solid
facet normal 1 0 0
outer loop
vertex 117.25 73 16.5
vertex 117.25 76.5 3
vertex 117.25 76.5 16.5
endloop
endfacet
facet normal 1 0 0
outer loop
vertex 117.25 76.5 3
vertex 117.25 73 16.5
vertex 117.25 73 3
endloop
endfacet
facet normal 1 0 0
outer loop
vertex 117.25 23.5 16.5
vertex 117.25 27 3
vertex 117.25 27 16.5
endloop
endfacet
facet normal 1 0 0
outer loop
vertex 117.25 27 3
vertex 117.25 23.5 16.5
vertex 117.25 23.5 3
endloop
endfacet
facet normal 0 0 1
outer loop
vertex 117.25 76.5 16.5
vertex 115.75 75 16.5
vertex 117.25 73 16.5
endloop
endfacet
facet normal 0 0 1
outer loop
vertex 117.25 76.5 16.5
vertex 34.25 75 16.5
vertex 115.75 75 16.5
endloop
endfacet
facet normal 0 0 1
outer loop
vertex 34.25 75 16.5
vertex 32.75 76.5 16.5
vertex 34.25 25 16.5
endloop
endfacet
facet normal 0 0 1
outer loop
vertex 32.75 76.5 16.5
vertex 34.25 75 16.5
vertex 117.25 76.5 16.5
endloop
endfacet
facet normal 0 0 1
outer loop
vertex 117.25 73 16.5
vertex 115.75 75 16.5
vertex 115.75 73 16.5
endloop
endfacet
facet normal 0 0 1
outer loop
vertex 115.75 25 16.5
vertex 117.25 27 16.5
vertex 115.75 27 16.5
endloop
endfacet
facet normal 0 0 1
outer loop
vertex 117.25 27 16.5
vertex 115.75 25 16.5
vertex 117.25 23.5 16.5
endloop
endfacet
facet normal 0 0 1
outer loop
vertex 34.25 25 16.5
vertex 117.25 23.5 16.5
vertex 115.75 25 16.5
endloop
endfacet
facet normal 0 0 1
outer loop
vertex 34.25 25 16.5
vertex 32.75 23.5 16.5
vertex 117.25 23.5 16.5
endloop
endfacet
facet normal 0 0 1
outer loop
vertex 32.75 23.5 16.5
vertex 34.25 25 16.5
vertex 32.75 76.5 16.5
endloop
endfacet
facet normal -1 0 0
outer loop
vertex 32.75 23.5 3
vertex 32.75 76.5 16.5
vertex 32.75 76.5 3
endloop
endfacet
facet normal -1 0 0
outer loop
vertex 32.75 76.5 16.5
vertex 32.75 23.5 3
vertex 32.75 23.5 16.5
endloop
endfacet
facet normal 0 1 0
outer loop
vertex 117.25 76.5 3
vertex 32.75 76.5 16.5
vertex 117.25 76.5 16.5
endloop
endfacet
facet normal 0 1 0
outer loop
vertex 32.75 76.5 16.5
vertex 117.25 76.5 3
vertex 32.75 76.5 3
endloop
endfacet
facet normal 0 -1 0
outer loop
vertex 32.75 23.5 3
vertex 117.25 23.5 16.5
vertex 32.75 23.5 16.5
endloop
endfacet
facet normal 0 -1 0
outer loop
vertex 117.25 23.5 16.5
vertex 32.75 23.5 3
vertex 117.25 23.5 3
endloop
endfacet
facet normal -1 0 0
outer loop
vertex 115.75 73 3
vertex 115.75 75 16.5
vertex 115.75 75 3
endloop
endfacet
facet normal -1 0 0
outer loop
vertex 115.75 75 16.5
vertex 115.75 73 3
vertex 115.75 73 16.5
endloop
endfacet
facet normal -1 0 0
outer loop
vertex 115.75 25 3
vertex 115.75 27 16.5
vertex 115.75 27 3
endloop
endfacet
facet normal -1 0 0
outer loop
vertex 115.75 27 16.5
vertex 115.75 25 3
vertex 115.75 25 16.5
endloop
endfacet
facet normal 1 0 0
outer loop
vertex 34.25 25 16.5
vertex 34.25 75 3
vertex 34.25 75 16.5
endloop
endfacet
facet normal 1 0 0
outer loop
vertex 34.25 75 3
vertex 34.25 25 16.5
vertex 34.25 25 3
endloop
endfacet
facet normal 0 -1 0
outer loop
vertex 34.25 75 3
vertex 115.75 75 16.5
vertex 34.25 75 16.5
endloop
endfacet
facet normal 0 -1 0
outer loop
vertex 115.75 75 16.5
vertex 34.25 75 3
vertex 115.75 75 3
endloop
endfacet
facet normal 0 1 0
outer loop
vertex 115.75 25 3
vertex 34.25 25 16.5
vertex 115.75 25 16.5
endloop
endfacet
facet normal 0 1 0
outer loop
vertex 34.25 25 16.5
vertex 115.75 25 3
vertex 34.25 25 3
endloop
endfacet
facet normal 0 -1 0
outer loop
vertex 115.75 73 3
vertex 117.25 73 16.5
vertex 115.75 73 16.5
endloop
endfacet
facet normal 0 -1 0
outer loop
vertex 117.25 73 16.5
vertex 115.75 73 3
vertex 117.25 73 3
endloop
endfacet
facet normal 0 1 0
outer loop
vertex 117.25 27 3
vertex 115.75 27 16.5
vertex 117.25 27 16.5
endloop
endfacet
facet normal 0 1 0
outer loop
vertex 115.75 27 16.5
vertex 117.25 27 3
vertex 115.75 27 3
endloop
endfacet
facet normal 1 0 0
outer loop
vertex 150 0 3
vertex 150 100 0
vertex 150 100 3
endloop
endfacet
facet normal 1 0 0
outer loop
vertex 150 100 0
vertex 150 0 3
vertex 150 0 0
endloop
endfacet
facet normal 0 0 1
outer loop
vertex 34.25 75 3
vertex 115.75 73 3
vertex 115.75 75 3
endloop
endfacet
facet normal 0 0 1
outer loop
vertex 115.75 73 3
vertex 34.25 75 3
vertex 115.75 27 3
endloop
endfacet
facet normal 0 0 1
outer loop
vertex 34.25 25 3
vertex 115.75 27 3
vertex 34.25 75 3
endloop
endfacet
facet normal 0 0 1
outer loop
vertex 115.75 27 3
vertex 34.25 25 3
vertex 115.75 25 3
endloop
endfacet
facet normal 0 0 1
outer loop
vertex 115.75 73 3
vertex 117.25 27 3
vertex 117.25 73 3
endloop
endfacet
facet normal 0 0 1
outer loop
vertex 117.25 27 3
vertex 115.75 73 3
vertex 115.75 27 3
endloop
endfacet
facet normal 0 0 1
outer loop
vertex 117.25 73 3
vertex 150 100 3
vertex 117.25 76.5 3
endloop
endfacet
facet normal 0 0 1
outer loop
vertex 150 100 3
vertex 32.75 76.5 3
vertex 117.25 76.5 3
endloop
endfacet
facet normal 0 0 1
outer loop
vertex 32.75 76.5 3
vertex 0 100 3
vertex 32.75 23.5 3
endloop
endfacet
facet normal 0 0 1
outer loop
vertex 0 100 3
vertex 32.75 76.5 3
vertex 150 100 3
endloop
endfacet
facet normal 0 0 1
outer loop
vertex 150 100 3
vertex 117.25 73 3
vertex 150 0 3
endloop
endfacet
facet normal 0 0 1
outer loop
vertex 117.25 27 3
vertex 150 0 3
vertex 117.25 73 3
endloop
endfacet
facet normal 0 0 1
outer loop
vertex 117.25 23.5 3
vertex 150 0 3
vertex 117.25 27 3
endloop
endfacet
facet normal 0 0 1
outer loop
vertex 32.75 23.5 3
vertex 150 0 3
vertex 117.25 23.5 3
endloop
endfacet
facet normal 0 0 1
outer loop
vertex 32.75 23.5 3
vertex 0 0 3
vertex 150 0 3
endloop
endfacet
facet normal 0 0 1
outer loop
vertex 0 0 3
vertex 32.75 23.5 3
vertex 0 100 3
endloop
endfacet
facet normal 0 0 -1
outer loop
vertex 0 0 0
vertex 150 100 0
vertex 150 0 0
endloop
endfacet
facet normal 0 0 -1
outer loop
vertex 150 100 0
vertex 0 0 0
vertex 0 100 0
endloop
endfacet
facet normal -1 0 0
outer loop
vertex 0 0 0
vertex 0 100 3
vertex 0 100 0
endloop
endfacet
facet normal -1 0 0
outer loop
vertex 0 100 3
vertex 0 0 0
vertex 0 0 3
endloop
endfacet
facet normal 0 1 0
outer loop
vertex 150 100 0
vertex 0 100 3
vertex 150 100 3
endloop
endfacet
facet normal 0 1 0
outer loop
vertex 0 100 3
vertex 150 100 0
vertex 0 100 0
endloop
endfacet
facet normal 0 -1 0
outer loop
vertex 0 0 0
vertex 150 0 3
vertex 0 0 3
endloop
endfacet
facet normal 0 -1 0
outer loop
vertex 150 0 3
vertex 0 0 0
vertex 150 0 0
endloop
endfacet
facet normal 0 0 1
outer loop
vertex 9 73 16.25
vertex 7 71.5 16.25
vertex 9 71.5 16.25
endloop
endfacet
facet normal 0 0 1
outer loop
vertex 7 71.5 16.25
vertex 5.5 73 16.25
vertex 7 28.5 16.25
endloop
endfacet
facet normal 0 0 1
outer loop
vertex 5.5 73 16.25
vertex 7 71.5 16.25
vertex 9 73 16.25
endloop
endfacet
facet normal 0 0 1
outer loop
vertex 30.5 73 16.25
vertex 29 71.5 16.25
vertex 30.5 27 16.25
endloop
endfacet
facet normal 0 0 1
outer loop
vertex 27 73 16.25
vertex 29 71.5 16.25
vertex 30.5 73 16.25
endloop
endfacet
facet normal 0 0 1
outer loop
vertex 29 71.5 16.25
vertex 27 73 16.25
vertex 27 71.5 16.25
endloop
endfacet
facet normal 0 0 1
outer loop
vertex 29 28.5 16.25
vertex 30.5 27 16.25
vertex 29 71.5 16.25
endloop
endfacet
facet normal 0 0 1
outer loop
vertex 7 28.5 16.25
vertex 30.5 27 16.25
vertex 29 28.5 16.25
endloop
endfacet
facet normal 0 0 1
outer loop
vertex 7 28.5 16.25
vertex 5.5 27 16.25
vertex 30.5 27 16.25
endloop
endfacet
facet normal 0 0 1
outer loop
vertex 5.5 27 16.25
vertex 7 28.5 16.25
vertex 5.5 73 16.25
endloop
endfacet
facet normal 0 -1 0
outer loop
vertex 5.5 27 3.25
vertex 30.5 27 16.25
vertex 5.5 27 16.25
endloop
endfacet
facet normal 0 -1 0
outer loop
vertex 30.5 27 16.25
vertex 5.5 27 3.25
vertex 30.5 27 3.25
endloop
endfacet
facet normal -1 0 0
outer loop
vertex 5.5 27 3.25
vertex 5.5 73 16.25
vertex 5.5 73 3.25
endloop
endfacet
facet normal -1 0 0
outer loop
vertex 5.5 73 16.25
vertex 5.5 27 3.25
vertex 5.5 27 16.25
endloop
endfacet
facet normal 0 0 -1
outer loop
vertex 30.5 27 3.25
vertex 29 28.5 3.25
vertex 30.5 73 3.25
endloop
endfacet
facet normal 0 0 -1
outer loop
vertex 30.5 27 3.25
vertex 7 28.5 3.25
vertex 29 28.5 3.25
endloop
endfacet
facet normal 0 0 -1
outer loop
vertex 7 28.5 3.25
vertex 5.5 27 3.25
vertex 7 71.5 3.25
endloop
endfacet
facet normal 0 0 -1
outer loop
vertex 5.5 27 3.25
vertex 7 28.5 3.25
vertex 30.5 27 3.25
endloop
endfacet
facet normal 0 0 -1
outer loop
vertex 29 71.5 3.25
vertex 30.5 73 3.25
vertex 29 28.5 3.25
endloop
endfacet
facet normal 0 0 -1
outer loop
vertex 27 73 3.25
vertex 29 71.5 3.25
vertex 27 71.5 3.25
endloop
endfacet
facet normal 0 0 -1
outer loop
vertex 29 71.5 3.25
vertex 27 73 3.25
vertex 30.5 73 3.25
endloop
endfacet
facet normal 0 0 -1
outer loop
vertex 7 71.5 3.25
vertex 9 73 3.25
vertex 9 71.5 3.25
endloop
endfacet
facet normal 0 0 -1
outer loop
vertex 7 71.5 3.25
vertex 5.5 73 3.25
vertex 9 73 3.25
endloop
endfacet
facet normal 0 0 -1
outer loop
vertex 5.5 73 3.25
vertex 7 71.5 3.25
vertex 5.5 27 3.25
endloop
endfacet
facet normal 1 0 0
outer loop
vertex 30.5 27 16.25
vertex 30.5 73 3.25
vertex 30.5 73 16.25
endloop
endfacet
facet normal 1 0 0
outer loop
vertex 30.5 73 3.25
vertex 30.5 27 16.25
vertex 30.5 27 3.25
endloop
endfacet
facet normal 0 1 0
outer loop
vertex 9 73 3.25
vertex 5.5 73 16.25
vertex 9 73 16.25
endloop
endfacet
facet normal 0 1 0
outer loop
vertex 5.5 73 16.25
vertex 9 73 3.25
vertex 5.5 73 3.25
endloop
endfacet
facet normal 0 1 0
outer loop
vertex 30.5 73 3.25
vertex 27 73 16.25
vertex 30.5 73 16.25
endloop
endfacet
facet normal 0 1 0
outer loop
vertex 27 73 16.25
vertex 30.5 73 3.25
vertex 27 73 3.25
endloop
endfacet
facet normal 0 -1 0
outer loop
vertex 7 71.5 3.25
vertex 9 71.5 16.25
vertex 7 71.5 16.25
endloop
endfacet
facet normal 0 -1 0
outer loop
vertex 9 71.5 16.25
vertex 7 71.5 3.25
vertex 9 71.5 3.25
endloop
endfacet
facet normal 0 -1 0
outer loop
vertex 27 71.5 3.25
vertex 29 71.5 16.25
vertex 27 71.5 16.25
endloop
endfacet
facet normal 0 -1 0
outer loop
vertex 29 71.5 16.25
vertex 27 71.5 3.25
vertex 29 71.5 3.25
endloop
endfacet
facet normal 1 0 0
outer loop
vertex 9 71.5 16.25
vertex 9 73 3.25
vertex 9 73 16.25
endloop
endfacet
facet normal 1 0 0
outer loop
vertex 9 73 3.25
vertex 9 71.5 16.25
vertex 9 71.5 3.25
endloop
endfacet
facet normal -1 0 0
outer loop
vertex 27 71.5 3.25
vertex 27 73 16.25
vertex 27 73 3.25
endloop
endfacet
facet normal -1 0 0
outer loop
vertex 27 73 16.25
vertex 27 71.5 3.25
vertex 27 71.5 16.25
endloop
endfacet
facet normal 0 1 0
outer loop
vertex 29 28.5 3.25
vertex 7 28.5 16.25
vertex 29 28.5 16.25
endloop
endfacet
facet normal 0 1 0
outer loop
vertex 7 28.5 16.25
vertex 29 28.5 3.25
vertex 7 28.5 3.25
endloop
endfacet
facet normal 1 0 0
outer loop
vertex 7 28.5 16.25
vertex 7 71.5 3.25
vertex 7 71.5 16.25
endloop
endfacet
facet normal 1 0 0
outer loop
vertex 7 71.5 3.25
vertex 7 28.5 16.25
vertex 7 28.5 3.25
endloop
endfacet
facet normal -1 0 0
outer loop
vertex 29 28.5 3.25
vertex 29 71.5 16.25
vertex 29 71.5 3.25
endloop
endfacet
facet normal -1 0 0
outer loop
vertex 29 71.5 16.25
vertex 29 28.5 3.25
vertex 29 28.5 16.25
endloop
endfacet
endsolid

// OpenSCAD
// Description: Quadcopter Baseplate for mounting 3DR Pixel Hawk and ORX R165X Reciver.
//              For use with similar plates to create a Quadcopter without arms.
// Authors: Leo Mahdessian
// 
// Licence:
// This work is licensed under the Creative Commons Attribution-NonCommercial-ShareAlike 4.0 International License. 
// To view a copy of this license, visit http://creativecommons.org/licenses/by-nc-sa/4.0/ or send a letter to Creative Commons, 444 Castro Street, Suite 900, Mountain View, California, 94041, USA.


//Sets Resolution
$fn = 30;

//Baseplate and Pixel Hawk holder
module plate(length, width, height) {
	cube([length, width, height]);
	
	difference(){
		difference() {
	
			translate([length/2, width/2, 7.75+1]) {
				cube([81.5+height, 50+height, 15.5], center=true);	
			}

			translate([length/2, width/2, 7.75+1]) {
				cube([81.5, 50, 15.5], center=true);
			}
		}
		
		translate([length/2+41, width/2, 7.75+1]) {
			cube([3, 46, 15.5], center=true);
		}
	}

}

//Orange Reciver Holder
module RCreceiver() {
	difference() {
		difference() {
			rotate(a = 90, v = [0,0,1]) {
				translate([50, -18, 9.75]) {
					cube([46, 25, 13], center = true); 
				}
			}

			rotate(a = 90, v = [0,0,1]) {
				translate([73, -18, 9.75]) {
					cube([3, 18, 13], center = true); 
				}
			}

		}

		rotate(a = 90, v = [0,0,1]) {
			translate([50, -18, 9.75]) {
				cube([43, 22, 13], center = true); 
			}
		}
	}
}

plate(150, 100, 3);
RCreceiver();
